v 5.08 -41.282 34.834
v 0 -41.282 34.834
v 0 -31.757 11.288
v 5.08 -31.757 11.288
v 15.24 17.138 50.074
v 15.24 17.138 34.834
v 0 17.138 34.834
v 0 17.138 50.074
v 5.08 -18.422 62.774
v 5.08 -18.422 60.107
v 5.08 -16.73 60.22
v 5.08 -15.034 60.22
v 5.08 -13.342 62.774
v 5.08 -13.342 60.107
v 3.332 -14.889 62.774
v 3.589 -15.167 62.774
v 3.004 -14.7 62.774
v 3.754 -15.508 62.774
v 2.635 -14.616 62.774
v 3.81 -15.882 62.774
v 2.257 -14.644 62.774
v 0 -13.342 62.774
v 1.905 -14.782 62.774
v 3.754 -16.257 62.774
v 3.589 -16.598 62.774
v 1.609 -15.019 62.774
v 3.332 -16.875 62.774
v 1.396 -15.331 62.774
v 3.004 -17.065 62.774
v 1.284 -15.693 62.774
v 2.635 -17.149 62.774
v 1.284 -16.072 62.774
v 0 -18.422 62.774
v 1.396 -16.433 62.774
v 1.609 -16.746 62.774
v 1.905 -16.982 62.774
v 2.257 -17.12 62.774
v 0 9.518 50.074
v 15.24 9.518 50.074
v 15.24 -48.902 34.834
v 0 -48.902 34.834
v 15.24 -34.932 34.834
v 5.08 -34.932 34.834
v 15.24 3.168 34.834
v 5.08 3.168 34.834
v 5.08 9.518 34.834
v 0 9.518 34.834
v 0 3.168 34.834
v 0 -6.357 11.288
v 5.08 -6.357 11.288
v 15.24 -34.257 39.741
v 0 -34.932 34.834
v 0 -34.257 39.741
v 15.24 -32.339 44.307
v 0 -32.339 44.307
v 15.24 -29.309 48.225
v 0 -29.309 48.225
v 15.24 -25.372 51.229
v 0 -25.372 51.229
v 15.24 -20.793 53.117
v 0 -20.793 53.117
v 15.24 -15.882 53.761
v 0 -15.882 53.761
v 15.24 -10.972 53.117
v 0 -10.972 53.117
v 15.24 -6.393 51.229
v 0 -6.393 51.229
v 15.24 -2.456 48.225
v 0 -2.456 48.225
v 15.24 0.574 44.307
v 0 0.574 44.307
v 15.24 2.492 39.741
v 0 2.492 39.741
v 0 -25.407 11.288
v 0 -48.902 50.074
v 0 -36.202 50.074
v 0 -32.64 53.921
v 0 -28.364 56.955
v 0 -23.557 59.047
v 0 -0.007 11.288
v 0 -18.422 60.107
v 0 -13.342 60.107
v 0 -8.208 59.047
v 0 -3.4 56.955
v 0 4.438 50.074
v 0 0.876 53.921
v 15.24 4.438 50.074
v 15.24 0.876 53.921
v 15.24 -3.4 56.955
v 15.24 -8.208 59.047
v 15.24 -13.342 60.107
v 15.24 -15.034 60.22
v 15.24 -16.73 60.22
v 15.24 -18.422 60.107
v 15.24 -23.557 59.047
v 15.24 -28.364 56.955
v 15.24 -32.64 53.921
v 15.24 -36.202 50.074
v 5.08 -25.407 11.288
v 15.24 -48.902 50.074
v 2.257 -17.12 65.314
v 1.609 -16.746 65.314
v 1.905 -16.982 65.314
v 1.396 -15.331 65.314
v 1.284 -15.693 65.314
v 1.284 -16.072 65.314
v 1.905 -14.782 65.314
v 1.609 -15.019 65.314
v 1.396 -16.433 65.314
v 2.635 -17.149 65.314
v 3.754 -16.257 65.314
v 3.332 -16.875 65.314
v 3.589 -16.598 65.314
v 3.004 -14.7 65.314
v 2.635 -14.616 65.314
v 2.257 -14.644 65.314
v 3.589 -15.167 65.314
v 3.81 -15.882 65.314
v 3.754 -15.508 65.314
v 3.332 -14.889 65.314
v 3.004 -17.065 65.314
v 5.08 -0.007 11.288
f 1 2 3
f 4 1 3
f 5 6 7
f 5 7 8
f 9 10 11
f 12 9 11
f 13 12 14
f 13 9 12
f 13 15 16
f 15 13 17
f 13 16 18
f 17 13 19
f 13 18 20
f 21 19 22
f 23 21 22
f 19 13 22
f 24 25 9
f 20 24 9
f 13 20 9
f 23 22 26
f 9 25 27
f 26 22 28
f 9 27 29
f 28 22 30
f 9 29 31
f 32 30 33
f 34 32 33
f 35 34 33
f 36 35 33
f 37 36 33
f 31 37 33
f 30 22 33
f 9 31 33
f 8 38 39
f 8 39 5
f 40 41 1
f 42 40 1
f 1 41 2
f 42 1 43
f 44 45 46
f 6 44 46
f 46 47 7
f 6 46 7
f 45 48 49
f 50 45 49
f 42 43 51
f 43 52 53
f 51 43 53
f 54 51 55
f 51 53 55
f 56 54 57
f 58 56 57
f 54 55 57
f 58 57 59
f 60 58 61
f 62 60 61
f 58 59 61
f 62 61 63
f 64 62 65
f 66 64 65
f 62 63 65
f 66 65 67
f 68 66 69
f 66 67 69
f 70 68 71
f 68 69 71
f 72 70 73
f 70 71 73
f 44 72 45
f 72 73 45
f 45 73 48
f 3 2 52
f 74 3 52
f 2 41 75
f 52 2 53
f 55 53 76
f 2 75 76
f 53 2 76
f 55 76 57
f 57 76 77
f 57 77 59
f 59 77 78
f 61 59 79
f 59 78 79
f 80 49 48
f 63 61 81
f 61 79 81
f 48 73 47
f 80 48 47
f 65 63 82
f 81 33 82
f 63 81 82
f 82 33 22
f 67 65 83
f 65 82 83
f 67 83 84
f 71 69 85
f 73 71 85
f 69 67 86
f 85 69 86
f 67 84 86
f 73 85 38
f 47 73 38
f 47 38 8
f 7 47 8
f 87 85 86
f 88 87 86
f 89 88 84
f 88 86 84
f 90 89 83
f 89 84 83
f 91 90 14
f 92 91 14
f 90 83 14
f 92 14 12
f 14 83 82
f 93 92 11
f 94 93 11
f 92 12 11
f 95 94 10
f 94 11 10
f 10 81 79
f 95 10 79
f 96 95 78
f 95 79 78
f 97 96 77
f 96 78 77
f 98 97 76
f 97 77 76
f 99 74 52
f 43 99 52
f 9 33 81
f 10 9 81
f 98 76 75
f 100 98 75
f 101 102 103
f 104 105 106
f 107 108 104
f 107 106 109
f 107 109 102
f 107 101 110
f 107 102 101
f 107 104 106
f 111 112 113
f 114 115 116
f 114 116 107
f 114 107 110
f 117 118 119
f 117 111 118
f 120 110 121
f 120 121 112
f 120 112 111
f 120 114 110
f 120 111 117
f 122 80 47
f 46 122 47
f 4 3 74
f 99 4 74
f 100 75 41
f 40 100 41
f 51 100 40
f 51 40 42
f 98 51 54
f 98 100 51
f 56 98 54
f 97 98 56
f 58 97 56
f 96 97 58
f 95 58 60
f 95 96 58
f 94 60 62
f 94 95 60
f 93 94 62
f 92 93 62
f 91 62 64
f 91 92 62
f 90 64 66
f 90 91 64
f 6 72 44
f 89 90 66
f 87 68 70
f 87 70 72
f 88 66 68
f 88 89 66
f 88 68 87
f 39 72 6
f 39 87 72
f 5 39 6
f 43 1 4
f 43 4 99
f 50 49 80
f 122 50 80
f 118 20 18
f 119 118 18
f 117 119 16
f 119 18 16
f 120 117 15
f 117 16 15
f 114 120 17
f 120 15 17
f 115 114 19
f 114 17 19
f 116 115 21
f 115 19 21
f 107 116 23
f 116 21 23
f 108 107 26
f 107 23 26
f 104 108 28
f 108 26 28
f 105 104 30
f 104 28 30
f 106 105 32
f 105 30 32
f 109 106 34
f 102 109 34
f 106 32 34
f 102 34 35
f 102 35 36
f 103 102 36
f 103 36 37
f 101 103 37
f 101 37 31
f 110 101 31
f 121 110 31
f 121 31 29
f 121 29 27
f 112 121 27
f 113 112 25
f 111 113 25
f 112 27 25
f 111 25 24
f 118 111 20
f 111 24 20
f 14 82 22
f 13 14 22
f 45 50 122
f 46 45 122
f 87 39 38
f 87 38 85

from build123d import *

# Parameters (mm, degrees)
F0_W     = 7.62
F0_H     = 15.24
F1_DEPTH = 5.08
F2_R     = 1.27
F3_DEPTH = 2.54
F4_DEPTH = 15.24


# Not quite as in the source:
# - ends of sketch curves that miss each other by under 0.0002 mm in the source are joined


with BuildPart() as f1:
    # F0 (on Right) → F1 (new body)
    with BuildSketch(Plane.YZ):
        Polygon((9.5176697043, 34.8342186189), (3.1676697043, 34.8342186189), (-6.3573302957, 11.2877884223), (-0.0073302957, 11.2877884223), align=None)
        with BuildLine():
            ThreePointArc((4.4376274036, 50.074186893), (8.2142139606, 42.8663955151), (9.5176697043, 34.8342186189))
            Line((9.5176697043, 34.8342186189), (9.5176697043, 50.0742186189))
            Line((9.5176697043, 50.0742186189), (4.4376274036, 50.074186893))
        make_face()
        with Locations((13.3276697043, 42.4542186189)):
            Rectangle(F0_W, F0_H)
        Polygon((-48.9023302957, 50.0742186189), (-48.9023302957, 34.8342186189), (-41.2823302957, 34.8342186189), (-41.28180154, 34.8342186189), (-41.28180154, 50.0742186189), align=None)
        with BuildLine():
            Line((-41.28180154, 50.0742186189), (-41.28180154, 34.8342186189))
            ThreePointArc((-41.28180154, 34.8342186189), (-39.9783395258, 42.8664143264), (-36.2017354445, 50.0742186189))
            Line((-36.2017354445, 50.0742186189), (-41.28180154, 50.0742186189))
        make_face()
        Polygon((-41.28180154, 34.8342186189), (-41.2823302957, 34.8342186189), (-31.7573302957, 11.2877884223), (-25.4073302957, 11.2877884223), (-34.9323302957, 34.8342186189), align=None)
        with BuildLine():
            ThreePointArc((-13.3423302957, 60.1066603814), (-15.8823316277, 60.2339542396), (-18.4223302957, 60.1066072389))
            Line((-18.4223302957, 60.1066072389), (-18.4223302957, 57.6942186189))
            Line((-18.4223302957, 57.6942186189), (-13.3423302957, 57.6942186189))
            Line((-13.3423302957, 57.6942186189), (-13.3423302957, 60.1066603814))
        make_face()
        with BuildLine():
            Line((-18.4223302957, 62.7742186189), (-18.4223302957, 60.1066072389))
            ThreePointArc((-18.4223302957, 60.1066072389), (-15.8823316277, 60.2339542396), (-13.3423302957, 60.1066603814))
            Line((-13.3423302957, 60.1066603814), (-13.3423302957, 62.7742186189))
            Line((-13.3423302957, 62.7742186189), (-18.4223302957, 62.7742186189))
        make_face()
        with BuildLine():
            ThreePointArc((-36.2017354445, 50.0742186189), (-39.9783395258, 42.8664143264), (-41.28180154, 34.8342186189))
            Line((-41.28180154, 34.8342186189), (-34.9323302957, 34.8342186189))
            ThreePointArc((-34.9323302957, 34.8342186189), (-15.8823302957, 53.7607736673), (3.1676697043, 34.8342186189))
            Line((3.1676697043, 34.8342186189), (9.5176697043, 34.8342186189))
            ThreePointArc((9.5176697043, 34.8342186189), (8.2142139606, 42.8663955151), (4.4376274036, 50.074186893))
            ThreePointArc((4.4376274036, 50.074186893), (-3.4000386794, 56.9553751368), (-13.3423302957, 60.1066603814))
            Line((-13.3423302957, 60.1066603814), (-13.3423302957, 57.6942186189))
            Line((-13.3423302957, 57.6942186189), (-18.4223302957, 57.6942186189))
            Line((-18.4223302957, 57.6942186189), (-18.4223302957, 60.1066072389))
            ThreePointArc((-18.4223302957, 60.1066072389), (-28.3643072986, 56.9552543041), (-36.2017354445, 50.0742186189))
        make_face()
    extrude(amount=F1_DEPTH)

    # F2 (on face) → F3 (join)
    with BuildSketch(Plane.XY.offset(62.7742186189)):
        with Locations((2.54, -15.8823302957)):
            Circle(F2_R)
    extrude(amount=F3_DEPTH)

    # F0 (on Right) → F4 (join)
    with BuildSketch(Plane.YZ):
        Polygon((-48.9023302957, 50.0742186189), (-48.9023302957, 34.8342186189), (-41.2823302957, 34.8342186189), (-41.28180154, 34.8342186189), (-41.28180154, 50.0742186189), align=None)
        with BuildLine():
            Line((-41.28180154, 50.0742186189), (-41.28180154, 34.8342186189))
            ThreePointArc((-41.28180154, 34.8342186189), (-39.9783395258, 42.8664143264), (-36.2017354445, 50.0742186189))
            Line((-36.2017354445, 50.0742186189), (-41.28180154, 50.0742186189))
        make_face()
        with BuildLine():
            ThreePointArc((-36.2017354445, 50.0742186189), (-39.9783395258, 42.8664143264), (-41.28180154, 34.8342186189))
            Line((-41.28180154, 34.8342186189), (-34.9323302957, 34.8342186189))
            ThreePointArc((-34.9323302957, 34.8342186189), (-15.8823302957, 53.7607736673), (3.1676697043, 34.8342186189))
            Line((3.1676697043, 34.8342186189), (9.5176697043, 34.8342186189))
            ThreePointArc((9.5176697043, 34.8342186189), (8.2142139606, 42.8663955151), (4.4376274036, 50.074186893))
            ThreePointArc((4.4376274036, 50.074186893), (-3.4000386794, 56.9553751368), (-13.3423302957, 60.1066603814))
            Line((-13.3423302957, 60.1066603814), (-13.3423302957, 57.6942186189))
            Line((-13.3423302957, 57.6942186189), (-18.4223302957, 57.6942186189))
            Line((-18.4223302957, 57.6942186189), (-18.4223302957, 60.1066072389))
            ThreePointArc((-18.4223302957, 60.1066072389), (-28.3643072986, 56.9552543041), (-36.2017354445, 50.0742186189))
        make_face()
        with BuildLine():
            ThreePointArc((4.4376274036, 50.074186893), (8.2142139606, 42.8663955151), (9.5176697043, 34.8342186189))
            Line((9.5176697043, 34.8342186189), (9.5176697043, 50.0742186189))
            Line((9.5176697043, 50.0742186189), (4.4376274036, 50.074186893))
        make_face()
        with Locations((13.3276697043, 42.4542186189)):
            Rectangle(F0_W, F0_H)
        with BuildLine():
            ThreePointArc((-13.3423302957, 60.1066603814), (-15.8823316277, 60.2339542396), (-18.4223302957, 60.1066072389))
            Line((-18.4223302957, 60.1066072389), (-18.4223302957, 57.6942186189))
            Line((-18.4223302957, 57.6942186189), (-13.3423302957, 57.6942186189))
            Line((-13.3423302957, 57.6942186189), (-13.3423302957, 60.1066603814))
        make_face()
    extrude(amount=F4_DEPTH)


solid = f1.part
